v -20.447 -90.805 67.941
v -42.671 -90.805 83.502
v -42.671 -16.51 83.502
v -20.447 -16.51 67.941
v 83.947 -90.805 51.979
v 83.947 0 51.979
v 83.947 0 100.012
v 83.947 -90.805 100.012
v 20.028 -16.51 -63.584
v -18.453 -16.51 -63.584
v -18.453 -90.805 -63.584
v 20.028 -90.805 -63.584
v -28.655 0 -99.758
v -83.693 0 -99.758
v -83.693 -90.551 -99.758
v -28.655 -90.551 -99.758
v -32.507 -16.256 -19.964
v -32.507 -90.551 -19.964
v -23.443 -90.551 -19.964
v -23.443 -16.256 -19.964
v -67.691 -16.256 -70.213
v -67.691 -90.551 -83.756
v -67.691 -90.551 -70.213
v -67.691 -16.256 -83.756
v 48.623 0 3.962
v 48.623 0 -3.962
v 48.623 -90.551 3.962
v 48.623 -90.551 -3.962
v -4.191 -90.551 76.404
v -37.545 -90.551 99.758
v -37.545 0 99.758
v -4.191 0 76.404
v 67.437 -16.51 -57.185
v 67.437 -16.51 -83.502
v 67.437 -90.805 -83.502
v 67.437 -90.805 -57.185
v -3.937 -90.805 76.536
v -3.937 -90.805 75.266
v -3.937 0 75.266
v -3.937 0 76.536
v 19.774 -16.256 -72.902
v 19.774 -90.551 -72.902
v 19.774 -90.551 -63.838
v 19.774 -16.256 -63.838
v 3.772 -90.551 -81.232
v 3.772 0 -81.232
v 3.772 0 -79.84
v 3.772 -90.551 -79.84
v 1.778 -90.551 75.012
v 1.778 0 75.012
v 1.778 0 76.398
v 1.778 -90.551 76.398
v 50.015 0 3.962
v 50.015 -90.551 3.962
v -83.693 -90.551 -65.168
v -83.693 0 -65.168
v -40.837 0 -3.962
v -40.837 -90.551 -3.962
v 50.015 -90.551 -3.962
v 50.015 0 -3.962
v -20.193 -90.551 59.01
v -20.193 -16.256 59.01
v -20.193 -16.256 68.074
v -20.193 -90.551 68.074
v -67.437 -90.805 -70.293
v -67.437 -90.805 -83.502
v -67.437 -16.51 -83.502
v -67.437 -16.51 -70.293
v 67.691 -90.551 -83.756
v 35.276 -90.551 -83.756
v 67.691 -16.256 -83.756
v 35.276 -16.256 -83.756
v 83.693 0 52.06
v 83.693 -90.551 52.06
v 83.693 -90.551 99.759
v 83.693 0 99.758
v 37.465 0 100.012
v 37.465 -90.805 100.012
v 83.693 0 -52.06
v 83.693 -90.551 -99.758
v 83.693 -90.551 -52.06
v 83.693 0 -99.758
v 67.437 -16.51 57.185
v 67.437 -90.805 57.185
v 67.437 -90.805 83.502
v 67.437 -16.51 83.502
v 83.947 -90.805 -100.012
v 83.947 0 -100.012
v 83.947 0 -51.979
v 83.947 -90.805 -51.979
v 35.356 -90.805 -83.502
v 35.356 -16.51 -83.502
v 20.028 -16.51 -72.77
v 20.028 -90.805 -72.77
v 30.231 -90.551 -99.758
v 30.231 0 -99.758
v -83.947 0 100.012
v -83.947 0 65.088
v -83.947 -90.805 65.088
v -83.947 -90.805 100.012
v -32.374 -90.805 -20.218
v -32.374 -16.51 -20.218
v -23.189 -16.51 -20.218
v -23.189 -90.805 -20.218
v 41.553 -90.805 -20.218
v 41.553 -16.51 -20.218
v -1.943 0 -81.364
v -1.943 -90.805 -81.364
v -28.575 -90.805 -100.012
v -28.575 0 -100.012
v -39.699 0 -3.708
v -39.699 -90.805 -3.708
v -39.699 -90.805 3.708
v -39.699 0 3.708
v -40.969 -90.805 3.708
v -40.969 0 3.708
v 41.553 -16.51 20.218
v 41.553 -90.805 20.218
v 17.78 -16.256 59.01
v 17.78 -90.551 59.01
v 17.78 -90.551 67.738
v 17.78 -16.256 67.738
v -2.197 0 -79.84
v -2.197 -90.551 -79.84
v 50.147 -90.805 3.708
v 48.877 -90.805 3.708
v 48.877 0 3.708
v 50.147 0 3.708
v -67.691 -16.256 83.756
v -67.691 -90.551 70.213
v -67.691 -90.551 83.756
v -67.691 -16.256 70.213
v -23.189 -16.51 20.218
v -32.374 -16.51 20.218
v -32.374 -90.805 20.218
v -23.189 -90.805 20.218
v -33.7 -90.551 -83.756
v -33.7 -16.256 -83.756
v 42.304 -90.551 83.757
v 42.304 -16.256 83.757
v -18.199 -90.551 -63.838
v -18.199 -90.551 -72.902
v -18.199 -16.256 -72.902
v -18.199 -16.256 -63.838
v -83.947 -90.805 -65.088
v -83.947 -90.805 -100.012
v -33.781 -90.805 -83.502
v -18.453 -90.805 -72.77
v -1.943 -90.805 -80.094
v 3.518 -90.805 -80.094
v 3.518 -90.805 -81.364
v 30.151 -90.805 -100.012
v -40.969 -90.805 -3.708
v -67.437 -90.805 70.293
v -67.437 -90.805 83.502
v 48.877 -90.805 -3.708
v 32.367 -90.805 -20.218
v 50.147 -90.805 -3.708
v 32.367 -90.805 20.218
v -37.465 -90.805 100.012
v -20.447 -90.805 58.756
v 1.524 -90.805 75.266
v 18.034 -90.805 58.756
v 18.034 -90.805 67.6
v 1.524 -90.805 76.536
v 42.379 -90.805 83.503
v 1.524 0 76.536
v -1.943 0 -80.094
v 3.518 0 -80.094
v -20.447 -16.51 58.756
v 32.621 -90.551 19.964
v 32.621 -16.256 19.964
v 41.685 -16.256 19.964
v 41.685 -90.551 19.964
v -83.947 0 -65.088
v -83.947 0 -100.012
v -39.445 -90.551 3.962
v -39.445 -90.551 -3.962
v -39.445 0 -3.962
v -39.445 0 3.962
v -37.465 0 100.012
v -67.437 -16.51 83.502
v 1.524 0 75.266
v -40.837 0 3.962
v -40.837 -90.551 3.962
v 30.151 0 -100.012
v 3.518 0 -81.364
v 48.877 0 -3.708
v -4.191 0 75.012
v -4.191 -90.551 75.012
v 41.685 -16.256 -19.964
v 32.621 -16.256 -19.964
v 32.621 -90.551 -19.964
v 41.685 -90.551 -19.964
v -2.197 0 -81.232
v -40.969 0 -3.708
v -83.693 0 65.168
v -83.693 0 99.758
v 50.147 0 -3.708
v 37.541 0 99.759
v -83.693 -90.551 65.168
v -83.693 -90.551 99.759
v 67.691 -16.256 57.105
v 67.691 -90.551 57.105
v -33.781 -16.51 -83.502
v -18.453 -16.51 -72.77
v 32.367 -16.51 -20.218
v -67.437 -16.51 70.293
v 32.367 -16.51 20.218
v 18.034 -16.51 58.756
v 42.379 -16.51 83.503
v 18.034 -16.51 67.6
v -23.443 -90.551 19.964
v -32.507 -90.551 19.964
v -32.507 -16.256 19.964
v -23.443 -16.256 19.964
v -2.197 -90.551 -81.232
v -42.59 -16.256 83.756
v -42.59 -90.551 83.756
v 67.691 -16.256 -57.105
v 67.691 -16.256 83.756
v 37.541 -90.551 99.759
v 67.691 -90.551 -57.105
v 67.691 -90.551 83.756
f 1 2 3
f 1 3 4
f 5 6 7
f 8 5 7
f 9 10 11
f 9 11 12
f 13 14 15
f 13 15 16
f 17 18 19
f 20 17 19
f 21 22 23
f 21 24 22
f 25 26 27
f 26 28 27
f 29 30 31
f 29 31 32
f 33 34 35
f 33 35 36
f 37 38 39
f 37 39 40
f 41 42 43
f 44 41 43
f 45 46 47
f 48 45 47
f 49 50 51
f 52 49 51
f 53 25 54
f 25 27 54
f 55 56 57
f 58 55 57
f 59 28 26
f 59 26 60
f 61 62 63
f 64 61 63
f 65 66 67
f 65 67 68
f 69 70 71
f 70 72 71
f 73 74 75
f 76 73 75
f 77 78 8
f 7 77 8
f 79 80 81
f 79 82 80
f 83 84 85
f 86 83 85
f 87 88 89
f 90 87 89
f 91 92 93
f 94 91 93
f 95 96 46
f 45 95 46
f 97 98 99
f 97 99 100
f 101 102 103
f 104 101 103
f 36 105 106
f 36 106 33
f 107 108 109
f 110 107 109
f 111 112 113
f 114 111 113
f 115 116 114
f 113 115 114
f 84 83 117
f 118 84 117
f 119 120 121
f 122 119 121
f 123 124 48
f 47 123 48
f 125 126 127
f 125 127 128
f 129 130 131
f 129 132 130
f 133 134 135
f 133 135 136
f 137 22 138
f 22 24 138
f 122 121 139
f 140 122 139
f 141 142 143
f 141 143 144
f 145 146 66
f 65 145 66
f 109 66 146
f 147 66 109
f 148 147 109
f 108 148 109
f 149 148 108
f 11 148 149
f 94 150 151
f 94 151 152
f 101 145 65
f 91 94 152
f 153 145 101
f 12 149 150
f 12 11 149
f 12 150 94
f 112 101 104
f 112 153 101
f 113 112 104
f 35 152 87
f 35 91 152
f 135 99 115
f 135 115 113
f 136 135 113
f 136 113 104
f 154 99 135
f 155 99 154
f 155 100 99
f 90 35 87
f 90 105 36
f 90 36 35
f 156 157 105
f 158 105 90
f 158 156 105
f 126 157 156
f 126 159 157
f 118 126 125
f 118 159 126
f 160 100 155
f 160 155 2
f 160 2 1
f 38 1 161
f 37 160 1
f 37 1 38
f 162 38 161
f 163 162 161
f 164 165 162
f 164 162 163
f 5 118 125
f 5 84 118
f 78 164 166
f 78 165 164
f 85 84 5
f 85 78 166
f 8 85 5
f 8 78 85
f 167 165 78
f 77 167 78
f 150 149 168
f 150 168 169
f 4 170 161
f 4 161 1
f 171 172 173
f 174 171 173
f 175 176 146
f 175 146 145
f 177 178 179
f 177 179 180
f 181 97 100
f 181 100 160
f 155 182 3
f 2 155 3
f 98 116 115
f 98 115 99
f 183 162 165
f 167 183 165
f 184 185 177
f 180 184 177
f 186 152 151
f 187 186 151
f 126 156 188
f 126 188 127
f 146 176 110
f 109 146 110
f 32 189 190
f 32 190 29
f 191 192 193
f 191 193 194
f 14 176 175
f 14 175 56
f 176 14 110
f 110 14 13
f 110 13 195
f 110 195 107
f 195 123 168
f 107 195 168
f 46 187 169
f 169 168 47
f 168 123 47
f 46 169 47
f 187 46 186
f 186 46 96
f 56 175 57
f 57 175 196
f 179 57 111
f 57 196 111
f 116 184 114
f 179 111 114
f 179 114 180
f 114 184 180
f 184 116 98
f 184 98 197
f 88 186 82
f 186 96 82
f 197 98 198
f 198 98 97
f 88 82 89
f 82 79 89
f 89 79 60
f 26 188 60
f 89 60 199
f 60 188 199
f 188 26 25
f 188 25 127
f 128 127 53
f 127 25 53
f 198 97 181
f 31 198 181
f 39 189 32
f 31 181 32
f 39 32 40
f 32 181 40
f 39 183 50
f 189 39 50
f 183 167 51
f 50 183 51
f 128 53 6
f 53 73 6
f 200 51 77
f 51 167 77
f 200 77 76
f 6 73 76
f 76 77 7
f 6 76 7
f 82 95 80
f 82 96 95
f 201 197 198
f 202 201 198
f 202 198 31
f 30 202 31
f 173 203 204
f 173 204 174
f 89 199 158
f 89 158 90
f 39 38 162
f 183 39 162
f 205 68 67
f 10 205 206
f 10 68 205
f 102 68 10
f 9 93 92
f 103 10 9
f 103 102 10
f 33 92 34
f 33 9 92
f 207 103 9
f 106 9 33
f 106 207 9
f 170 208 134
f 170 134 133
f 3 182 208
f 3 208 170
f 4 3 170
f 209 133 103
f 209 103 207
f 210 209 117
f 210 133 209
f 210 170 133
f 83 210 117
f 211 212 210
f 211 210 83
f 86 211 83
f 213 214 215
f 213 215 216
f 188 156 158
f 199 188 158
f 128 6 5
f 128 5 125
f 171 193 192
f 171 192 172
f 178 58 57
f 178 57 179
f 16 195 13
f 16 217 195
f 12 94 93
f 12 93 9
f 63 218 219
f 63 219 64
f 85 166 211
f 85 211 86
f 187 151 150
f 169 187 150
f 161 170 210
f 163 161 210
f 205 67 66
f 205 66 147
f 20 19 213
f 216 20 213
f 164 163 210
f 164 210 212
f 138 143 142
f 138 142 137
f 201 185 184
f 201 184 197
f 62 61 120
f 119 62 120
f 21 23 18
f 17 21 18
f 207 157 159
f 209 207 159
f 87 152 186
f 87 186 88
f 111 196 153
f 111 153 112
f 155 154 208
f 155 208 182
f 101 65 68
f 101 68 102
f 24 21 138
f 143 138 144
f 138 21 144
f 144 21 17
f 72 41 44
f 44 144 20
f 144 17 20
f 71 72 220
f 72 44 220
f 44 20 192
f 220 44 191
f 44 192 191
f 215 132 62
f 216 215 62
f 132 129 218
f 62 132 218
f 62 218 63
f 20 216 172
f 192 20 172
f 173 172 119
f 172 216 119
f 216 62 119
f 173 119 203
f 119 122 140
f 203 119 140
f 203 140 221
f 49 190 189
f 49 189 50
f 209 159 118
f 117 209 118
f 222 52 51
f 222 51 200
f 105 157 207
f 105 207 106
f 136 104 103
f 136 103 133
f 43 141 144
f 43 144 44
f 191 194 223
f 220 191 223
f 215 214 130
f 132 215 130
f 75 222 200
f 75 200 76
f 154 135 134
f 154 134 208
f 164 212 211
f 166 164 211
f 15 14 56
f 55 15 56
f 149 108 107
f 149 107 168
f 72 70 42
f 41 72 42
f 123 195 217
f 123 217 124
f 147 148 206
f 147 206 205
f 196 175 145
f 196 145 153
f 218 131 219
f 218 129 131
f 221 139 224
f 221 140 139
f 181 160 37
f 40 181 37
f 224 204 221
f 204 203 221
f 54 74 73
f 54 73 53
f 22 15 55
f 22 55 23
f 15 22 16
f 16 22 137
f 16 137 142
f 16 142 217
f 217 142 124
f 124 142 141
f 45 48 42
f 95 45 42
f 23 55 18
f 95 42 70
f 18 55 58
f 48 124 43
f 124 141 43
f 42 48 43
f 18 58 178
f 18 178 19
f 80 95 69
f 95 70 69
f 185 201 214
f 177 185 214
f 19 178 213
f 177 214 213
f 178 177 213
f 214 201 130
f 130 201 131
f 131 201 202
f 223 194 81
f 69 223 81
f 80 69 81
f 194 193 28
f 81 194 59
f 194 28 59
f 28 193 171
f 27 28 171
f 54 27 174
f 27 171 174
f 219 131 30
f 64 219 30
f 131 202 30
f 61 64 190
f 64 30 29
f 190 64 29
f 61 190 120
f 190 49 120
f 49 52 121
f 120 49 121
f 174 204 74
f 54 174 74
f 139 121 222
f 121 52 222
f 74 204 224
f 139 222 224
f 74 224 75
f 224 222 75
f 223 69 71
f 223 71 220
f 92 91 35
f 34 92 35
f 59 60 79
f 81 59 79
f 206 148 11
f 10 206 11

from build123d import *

# Parameters (mm, degrees)
F0_W     = 167.894
F0_H     = 200.025
F1_DEPTH = 90.805
F2_W     = 1.27
F2_H     = 7.4168746429
F2_W_2   = 5.461
F2_H_2   = 1.27
F3_DEPTH = 90.806
F4_T     = -16.51
F5_T     = -0.254


with BuildPart() as f1:
    # F0 (on Front) → F1 (new body)
    with BuildSketch(Plane.XZ):
        Rectangle(F0_W, F0_H)
    extrude(amount=F1_DEPTH)

    # F2 (on face) → F3 (cut, through all)
    with BuildSketch(Plane.XZ.offset(90.805)):
        Polygon((37.465, 100.0125), (-37.465, 100.0125), (-3.937, 76.5359416589), (1.524, 76.5359416589), align=None)
        Polygon((-40.9689176242, 3.7084373214), (-83.947, 65.0875), (-83.947, -65.0875), (-40.9689176242, -3.7084373214), align=None)
        Polygon((83.947, -51.9794289873), (83.947, 51.9794289873), (50.1472877587, 3.7084373214), (50.1472877587, -3.7084373214), align=None)
        Polygon((-1.9427287361, -81.3643829014), (-28.575, -100.0125), (30.1505425278, -100.0125), (3.5182712639, -81.3643829014), align=None)
        with Locations((-40.3339176242, 0)):
            Rectangle(F2_W, F2_H)
        with Locations((49.5122877587, 0)):
            Rectangle(F2_W, F2_H)
        with Locations((-1.2065, 75.9009416589)):
            Rectangle(F2_W_2, F2_H_2)
        with Locations((0.7877712639, -80.7293829014)):
            Rectangle(F2_W_2, F2_H_2)
    extrude(amount=-F3_DEPTH, mode=Mode.SUBTRACT)

    # F4
    f4_openings = [f1.faces().sort_by_distance(p)[0] for p in [
        (2.503833, -90.805, -1.127696),
    ]]
    offset(amount=F4_T, openings=f4_openings, kind=Kind.INTERSECTION)

    # F5
    f5_openings = [f1.faces().sort_by_distance(p)[0] for p in [
        (2.503833, 0, -1.127696),
    ]]
    offset(amount=F5_T, openings=f5_openings, kind=Kind.INTERSECTION)


solid = f1.part
